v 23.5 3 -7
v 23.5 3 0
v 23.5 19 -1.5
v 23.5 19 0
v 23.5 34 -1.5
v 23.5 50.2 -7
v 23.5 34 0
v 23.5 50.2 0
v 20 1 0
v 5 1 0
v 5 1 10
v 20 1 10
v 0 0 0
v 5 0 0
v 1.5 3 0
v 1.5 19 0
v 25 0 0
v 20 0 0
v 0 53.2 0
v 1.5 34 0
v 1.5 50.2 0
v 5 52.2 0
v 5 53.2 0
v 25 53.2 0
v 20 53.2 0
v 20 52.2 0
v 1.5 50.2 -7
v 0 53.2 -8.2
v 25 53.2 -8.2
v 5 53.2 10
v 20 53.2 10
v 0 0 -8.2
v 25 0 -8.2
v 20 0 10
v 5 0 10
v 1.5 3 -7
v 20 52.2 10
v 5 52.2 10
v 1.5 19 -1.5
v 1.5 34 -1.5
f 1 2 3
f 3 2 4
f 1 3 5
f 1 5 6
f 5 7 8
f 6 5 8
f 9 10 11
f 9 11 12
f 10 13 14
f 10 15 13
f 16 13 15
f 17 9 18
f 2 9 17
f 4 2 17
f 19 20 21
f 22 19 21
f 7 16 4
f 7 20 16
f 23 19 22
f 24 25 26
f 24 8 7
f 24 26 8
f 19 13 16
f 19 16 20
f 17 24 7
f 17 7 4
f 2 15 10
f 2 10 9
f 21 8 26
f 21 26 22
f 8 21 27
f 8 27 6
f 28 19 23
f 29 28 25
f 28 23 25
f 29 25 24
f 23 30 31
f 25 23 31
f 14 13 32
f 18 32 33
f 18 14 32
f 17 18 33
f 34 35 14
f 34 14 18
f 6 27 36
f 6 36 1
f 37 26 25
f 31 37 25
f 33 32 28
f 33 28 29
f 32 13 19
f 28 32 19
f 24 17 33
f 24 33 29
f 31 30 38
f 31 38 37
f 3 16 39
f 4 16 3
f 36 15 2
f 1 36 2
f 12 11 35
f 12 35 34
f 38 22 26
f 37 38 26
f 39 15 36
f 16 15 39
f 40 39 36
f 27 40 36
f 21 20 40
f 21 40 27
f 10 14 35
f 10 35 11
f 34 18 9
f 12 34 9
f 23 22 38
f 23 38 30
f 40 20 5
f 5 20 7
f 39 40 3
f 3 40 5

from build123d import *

# Parameters (mm, degrees)
F0_W     = 25
F0_H     = 53.2
F1_DEPTH = 8.2
F2_W     = 15
F2_H     = 1
F3_DEPTH = 10
F4_W     = 22
F4_H     = 47.2
F5_DEPTH = 7
F6_W     = 22
F6_H     = 15
F7_DEPTH = 1.5


with BuildPart() as f1:
    # F0 (on Top) → F1 (new body)
    with BuildSketch(Plane.XY):
        with Locations((12.5, 26.6)):
            Rectangle(F0_W, F0_H)
    extrude(amount=-F1_DEPTH)

    # F2 (on Top) → F3 (join)
    with BuildSketch(Plane.XY):
        with Locations((12.5, 52.7)):
            Rectangle(F2_W, F2_H)
        with Locations((12.5, 0.5)):
            Rectangle(F2_W, F2_H)
    extrude(amount=F3_DEPTH)

    # F4 (on Top) → F5 (cut)
    with BuildSketch(Plane.XY):
        with Locations((12.5, 26.6)):
            Rectangle(F4_W, F4_H)
    extrude(amount=-F5_DEPTH, mode=Mode.SUBTRACT)

    # F6 (on Top) → F7 (join)
    with BuildSketch(Plane.XY):
        with Locations((12.5, 26.5)):
            Rectangle(F6_W, F6_H)
    extrude(amount=-F7_DEPTH)


solid = f1.part
